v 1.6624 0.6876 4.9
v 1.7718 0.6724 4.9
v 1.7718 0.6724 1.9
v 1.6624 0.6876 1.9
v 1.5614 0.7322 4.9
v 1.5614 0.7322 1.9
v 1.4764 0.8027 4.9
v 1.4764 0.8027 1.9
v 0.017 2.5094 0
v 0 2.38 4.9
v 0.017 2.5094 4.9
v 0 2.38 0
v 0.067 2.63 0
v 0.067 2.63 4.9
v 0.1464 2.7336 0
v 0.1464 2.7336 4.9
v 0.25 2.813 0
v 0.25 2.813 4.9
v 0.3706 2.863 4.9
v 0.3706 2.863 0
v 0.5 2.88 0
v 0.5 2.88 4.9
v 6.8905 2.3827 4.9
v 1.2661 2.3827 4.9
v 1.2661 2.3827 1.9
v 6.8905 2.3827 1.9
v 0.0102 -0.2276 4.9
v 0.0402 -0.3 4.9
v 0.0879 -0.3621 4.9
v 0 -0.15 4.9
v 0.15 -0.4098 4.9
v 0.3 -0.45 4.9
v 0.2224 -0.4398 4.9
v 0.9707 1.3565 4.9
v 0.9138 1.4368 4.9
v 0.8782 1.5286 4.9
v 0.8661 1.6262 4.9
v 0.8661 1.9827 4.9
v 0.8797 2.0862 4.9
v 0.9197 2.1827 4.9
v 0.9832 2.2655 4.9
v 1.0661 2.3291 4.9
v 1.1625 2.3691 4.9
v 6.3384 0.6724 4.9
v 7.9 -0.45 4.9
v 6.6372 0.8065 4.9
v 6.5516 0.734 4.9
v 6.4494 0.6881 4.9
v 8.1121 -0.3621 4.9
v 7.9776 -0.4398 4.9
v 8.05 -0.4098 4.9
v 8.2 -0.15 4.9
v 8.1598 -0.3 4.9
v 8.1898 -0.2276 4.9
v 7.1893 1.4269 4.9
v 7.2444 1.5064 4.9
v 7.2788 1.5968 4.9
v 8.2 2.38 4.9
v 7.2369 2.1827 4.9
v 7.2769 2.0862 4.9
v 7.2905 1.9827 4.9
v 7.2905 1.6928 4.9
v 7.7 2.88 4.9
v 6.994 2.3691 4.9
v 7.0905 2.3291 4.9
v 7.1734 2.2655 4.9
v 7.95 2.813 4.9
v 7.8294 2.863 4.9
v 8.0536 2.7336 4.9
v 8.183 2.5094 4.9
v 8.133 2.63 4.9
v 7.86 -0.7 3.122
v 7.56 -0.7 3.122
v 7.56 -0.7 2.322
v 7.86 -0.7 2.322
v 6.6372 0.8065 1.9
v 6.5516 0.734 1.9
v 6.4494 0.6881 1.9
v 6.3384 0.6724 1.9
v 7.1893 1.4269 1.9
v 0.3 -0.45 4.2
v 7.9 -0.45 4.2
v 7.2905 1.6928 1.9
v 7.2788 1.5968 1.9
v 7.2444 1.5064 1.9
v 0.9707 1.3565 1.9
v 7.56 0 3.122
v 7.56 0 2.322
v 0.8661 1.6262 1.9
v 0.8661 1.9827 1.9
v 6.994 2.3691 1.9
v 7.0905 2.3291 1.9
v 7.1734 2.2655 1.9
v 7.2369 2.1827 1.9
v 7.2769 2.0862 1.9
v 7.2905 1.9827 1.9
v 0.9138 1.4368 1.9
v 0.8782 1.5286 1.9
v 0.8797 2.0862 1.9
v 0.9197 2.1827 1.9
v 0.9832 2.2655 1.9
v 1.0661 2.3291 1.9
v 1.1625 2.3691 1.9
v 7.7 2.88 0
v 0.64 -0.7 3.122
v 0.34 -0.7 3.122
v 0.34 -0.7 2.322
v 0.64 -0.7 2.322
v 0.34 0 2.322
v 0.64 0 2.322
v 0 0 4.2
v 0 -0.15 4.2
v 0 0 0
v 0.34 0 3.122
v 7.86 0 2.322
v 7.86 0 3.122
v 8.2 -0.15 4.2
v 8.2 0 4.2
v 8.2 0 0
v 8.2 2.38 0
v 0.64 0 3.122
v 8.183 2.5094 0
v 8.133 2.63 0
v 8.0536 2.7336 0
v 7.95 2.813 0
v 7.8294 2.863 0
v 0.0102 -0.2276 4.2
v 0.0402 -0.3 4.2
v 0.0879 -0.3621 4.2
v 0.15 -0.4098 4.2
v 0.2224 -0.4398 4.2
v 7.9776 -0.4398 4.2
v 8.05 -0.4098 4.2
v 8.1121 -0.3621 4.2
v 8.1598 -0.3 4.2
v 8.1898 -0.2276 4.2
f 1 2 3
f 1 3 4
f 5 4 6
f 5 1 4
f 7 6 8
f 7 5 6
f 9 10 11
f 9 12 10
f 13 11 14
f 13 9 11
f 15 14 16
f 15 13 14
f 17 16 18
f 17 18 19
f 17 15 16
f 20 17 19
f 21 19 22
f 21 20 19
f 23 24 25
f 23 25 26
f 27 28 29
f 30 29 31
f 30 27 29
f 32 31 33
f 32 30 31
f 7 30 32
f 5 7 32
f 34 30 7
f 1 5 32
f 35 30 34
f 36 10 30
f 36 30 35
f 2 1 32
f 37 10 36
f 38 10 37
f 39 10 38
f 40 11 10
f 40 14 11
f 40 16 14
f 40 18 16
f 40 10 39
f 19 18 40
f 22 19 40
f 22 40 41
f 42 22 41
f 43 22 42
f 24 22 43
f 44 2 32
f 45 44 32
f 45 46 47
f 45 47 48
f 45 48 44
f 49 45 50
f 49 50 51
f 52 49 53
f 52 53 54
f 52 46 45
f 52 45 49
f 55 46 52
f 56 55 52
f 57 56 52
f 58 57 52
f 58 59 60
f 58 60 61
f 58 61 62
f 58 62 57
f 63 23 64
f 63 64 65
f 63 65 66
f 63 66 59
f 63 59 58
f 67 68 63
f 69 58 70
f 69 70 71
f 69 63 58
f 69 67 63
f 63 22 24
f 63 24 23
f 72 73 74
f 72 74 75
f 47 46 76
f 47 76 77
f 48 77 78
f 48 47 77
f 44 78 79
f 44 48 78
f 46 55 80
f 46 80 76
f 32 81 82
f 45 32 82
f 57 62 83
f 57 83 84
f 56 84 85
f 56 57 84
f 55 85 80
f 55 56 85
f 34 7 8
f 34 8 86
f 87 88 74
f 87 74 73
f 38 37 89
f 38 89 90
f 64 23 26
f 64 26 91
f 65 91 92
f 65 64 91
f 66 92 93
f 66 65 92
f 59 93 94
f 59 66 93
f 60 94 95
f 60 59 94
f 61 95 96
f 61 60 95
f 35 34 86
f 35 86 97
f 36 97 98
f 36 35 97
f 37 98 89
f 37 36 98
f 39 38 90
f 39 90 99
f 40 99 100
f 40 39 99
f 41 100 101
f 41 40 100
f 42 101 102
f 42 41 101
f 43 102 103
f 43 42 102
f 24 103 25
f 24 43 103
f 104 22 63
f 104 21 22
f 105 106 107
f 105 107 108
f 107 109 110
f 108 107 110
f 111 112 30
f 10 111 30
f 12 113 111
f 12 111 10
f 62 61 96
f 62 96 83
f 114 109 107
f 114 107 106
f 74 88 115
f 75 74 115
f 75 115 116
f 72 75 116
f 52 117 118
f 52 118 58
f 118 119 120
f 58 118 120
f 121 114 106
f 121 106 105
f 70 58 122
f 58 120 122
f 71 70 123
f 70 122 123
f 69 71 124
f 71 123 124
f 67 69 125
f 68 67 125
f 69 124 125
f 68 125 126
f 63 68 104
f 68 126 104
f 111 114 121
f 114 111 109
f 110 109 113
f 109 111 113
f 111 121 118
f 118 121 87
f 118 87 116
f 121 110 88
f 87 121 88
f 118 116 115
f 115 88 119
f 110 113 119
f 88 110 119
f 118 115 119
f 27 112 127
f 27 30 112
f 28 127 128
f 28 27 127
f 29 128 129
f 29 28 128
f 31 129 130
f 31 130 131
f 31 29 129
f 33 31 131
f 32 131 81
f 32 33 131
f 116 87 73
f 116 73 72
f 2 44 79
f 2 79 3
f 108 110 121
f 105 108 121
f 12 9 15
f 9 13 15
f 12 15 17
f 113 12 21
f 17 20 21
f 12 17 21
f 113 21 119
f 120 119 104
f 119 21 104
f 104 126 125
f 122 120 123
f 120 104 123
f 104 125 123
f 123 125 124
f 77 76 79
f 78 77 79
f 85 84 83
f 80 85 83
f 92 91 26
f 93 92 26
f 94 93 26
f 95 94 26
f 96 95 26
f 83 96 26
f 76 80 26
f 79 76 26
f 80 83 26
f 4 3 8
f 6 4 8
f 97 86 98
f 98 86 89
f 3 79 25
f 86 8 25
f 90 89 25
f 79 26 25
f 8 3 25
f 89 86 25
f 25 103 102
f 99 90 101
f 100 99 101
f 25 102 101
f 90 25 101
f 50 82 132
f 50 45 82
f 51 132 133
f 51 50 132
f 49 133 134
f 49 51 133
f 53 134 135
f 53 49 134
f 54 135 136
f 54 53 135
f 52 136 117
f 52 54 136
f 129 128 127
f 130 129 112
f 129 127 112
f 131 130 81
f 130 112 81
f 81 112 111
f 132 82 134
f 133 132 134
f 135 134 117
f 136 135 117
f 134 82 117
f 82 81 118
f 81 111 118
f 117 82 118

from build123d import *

# Parameters (mm, degrees)
SKETCH1_W           = 8.2
SKETCH1_H           = 2.88
BOSS_EXTRUDE1_DEPTH = 4.2
SKETCH2_W           = 8.2
SKETCH2_H           = 3.33
BOSS_EXTRUDE2_DEPTH = 0.7
FILLET1_R           = 0.5
FILLET2_R           = 0.3
CUT_EXTRUDE1_DEPTH  = 3
SKETCH4_W           = 0.3
SKETCH4_H           = 0.8
BOSS_EXTRUDE3_DEPTH = 0.7


with BuildPart() as part:
    # Sketch1 → Boss-Extrude1 (new body)
    with BuildSketch(Plane.XY):
        with Locations((4.1, 1.44)):
            Rectangle(SKETCH1_W, SKETCH1_H)
    extrude(amount=BOSS_EXTRUDE1_DEPTH)

    # Sketch2 → Boss-Extrude2 (add)
    with BuildSketch(Plane.XY.offset(4.2)):
        with Locations((4.1, 1.215)):
            Rectangle(SKETCH2_W, SKETCH2_H)
    extrude(amount=BOSS_EXTRUDE2_DEPTH)

    # Fillet1
    fillet1_edges = [part.edges().sort_by_distance(p)[0] for p in [
        (0, 2.88, 2.45),
        (8.2, 2.88, 2.45),
    ]]
    fillet(fillet1_edges, radius=FILLET1_R)

    # Fillet2
    fillet2_edges = [part.edges().sort_by_distance(p)[0] for p in [
        (8.2, -0.45, 4.55),
        (0, -0.45, 4.55),
    ]]
    fillet(fillet2_edges, radius=FILLET2_R)

    # Sketch3 → Cut-Extrude1 (cut)
    with BuildSketch(Plane.XY.offset(4.9)):
        with BuildLine():
            Line((1.266074212, 2.382685956), (6.890517388, 2.382685956))
            ThreePointArc((6.890517388, 2.382685956), (7.173360101, 2.265528668), (7.290517388, 1.982685956))
            Line((7.290517388, 1.982685956), (7.290517388, 1.692784748))
            ThreePointArc((7.290517388, 1.692784748), (7.264361959, 1.550516562), (7.189316204, 1.426853803))
            Line((7.189316204, 1.426853803), (6.63716933, 0.806464056))
            ThreePointArc((6.63716933, 0.806464056), (6.502119746, 0.707448171), (6.338370514, 0.672395002))
            Line((6.338370514, 0.672395002), (1.771767033, 0.672395002))
            ThreePointArc((1.771767033, 0.672395002), (1.610340732, 0.706414744), (1.476372836, 0.802687256))
            Line((1.476372836, 0.802687256), (0.970680014, 1.356541299))
            ThreePointArc((0.970680014, 1.356541299), (0.893141457, 1.481607555), (0.866074212, 1.626249045))
            Line((0.866074212, 1.626249045), (0.866074212, 1.982685956))
            ThreePointArc((0.866074212, 1.982685956), (0.983231499, 2.265528668), (1.266074212, 2.382685956))
        make_face()
    extrude(amount=-CUT_EXTRUDE1_DEPTH, mode=Mode.SUBTRACT)

    # Sketch4 → Boss-Extrude3 (add)
    with BuildSketch(Plane.XZ):
        with Locations((0.49, 2.722)):
            Rectangle(SKETCH4_W, SKETCH4_H)
        with Locations((7.710000038, 2.722)):
            Rectangle(SKETCH4_W, SKETCH4_H)
    extrude(amount=BOSS_EXTRUDE3_DEPTH)


solid = part.part
